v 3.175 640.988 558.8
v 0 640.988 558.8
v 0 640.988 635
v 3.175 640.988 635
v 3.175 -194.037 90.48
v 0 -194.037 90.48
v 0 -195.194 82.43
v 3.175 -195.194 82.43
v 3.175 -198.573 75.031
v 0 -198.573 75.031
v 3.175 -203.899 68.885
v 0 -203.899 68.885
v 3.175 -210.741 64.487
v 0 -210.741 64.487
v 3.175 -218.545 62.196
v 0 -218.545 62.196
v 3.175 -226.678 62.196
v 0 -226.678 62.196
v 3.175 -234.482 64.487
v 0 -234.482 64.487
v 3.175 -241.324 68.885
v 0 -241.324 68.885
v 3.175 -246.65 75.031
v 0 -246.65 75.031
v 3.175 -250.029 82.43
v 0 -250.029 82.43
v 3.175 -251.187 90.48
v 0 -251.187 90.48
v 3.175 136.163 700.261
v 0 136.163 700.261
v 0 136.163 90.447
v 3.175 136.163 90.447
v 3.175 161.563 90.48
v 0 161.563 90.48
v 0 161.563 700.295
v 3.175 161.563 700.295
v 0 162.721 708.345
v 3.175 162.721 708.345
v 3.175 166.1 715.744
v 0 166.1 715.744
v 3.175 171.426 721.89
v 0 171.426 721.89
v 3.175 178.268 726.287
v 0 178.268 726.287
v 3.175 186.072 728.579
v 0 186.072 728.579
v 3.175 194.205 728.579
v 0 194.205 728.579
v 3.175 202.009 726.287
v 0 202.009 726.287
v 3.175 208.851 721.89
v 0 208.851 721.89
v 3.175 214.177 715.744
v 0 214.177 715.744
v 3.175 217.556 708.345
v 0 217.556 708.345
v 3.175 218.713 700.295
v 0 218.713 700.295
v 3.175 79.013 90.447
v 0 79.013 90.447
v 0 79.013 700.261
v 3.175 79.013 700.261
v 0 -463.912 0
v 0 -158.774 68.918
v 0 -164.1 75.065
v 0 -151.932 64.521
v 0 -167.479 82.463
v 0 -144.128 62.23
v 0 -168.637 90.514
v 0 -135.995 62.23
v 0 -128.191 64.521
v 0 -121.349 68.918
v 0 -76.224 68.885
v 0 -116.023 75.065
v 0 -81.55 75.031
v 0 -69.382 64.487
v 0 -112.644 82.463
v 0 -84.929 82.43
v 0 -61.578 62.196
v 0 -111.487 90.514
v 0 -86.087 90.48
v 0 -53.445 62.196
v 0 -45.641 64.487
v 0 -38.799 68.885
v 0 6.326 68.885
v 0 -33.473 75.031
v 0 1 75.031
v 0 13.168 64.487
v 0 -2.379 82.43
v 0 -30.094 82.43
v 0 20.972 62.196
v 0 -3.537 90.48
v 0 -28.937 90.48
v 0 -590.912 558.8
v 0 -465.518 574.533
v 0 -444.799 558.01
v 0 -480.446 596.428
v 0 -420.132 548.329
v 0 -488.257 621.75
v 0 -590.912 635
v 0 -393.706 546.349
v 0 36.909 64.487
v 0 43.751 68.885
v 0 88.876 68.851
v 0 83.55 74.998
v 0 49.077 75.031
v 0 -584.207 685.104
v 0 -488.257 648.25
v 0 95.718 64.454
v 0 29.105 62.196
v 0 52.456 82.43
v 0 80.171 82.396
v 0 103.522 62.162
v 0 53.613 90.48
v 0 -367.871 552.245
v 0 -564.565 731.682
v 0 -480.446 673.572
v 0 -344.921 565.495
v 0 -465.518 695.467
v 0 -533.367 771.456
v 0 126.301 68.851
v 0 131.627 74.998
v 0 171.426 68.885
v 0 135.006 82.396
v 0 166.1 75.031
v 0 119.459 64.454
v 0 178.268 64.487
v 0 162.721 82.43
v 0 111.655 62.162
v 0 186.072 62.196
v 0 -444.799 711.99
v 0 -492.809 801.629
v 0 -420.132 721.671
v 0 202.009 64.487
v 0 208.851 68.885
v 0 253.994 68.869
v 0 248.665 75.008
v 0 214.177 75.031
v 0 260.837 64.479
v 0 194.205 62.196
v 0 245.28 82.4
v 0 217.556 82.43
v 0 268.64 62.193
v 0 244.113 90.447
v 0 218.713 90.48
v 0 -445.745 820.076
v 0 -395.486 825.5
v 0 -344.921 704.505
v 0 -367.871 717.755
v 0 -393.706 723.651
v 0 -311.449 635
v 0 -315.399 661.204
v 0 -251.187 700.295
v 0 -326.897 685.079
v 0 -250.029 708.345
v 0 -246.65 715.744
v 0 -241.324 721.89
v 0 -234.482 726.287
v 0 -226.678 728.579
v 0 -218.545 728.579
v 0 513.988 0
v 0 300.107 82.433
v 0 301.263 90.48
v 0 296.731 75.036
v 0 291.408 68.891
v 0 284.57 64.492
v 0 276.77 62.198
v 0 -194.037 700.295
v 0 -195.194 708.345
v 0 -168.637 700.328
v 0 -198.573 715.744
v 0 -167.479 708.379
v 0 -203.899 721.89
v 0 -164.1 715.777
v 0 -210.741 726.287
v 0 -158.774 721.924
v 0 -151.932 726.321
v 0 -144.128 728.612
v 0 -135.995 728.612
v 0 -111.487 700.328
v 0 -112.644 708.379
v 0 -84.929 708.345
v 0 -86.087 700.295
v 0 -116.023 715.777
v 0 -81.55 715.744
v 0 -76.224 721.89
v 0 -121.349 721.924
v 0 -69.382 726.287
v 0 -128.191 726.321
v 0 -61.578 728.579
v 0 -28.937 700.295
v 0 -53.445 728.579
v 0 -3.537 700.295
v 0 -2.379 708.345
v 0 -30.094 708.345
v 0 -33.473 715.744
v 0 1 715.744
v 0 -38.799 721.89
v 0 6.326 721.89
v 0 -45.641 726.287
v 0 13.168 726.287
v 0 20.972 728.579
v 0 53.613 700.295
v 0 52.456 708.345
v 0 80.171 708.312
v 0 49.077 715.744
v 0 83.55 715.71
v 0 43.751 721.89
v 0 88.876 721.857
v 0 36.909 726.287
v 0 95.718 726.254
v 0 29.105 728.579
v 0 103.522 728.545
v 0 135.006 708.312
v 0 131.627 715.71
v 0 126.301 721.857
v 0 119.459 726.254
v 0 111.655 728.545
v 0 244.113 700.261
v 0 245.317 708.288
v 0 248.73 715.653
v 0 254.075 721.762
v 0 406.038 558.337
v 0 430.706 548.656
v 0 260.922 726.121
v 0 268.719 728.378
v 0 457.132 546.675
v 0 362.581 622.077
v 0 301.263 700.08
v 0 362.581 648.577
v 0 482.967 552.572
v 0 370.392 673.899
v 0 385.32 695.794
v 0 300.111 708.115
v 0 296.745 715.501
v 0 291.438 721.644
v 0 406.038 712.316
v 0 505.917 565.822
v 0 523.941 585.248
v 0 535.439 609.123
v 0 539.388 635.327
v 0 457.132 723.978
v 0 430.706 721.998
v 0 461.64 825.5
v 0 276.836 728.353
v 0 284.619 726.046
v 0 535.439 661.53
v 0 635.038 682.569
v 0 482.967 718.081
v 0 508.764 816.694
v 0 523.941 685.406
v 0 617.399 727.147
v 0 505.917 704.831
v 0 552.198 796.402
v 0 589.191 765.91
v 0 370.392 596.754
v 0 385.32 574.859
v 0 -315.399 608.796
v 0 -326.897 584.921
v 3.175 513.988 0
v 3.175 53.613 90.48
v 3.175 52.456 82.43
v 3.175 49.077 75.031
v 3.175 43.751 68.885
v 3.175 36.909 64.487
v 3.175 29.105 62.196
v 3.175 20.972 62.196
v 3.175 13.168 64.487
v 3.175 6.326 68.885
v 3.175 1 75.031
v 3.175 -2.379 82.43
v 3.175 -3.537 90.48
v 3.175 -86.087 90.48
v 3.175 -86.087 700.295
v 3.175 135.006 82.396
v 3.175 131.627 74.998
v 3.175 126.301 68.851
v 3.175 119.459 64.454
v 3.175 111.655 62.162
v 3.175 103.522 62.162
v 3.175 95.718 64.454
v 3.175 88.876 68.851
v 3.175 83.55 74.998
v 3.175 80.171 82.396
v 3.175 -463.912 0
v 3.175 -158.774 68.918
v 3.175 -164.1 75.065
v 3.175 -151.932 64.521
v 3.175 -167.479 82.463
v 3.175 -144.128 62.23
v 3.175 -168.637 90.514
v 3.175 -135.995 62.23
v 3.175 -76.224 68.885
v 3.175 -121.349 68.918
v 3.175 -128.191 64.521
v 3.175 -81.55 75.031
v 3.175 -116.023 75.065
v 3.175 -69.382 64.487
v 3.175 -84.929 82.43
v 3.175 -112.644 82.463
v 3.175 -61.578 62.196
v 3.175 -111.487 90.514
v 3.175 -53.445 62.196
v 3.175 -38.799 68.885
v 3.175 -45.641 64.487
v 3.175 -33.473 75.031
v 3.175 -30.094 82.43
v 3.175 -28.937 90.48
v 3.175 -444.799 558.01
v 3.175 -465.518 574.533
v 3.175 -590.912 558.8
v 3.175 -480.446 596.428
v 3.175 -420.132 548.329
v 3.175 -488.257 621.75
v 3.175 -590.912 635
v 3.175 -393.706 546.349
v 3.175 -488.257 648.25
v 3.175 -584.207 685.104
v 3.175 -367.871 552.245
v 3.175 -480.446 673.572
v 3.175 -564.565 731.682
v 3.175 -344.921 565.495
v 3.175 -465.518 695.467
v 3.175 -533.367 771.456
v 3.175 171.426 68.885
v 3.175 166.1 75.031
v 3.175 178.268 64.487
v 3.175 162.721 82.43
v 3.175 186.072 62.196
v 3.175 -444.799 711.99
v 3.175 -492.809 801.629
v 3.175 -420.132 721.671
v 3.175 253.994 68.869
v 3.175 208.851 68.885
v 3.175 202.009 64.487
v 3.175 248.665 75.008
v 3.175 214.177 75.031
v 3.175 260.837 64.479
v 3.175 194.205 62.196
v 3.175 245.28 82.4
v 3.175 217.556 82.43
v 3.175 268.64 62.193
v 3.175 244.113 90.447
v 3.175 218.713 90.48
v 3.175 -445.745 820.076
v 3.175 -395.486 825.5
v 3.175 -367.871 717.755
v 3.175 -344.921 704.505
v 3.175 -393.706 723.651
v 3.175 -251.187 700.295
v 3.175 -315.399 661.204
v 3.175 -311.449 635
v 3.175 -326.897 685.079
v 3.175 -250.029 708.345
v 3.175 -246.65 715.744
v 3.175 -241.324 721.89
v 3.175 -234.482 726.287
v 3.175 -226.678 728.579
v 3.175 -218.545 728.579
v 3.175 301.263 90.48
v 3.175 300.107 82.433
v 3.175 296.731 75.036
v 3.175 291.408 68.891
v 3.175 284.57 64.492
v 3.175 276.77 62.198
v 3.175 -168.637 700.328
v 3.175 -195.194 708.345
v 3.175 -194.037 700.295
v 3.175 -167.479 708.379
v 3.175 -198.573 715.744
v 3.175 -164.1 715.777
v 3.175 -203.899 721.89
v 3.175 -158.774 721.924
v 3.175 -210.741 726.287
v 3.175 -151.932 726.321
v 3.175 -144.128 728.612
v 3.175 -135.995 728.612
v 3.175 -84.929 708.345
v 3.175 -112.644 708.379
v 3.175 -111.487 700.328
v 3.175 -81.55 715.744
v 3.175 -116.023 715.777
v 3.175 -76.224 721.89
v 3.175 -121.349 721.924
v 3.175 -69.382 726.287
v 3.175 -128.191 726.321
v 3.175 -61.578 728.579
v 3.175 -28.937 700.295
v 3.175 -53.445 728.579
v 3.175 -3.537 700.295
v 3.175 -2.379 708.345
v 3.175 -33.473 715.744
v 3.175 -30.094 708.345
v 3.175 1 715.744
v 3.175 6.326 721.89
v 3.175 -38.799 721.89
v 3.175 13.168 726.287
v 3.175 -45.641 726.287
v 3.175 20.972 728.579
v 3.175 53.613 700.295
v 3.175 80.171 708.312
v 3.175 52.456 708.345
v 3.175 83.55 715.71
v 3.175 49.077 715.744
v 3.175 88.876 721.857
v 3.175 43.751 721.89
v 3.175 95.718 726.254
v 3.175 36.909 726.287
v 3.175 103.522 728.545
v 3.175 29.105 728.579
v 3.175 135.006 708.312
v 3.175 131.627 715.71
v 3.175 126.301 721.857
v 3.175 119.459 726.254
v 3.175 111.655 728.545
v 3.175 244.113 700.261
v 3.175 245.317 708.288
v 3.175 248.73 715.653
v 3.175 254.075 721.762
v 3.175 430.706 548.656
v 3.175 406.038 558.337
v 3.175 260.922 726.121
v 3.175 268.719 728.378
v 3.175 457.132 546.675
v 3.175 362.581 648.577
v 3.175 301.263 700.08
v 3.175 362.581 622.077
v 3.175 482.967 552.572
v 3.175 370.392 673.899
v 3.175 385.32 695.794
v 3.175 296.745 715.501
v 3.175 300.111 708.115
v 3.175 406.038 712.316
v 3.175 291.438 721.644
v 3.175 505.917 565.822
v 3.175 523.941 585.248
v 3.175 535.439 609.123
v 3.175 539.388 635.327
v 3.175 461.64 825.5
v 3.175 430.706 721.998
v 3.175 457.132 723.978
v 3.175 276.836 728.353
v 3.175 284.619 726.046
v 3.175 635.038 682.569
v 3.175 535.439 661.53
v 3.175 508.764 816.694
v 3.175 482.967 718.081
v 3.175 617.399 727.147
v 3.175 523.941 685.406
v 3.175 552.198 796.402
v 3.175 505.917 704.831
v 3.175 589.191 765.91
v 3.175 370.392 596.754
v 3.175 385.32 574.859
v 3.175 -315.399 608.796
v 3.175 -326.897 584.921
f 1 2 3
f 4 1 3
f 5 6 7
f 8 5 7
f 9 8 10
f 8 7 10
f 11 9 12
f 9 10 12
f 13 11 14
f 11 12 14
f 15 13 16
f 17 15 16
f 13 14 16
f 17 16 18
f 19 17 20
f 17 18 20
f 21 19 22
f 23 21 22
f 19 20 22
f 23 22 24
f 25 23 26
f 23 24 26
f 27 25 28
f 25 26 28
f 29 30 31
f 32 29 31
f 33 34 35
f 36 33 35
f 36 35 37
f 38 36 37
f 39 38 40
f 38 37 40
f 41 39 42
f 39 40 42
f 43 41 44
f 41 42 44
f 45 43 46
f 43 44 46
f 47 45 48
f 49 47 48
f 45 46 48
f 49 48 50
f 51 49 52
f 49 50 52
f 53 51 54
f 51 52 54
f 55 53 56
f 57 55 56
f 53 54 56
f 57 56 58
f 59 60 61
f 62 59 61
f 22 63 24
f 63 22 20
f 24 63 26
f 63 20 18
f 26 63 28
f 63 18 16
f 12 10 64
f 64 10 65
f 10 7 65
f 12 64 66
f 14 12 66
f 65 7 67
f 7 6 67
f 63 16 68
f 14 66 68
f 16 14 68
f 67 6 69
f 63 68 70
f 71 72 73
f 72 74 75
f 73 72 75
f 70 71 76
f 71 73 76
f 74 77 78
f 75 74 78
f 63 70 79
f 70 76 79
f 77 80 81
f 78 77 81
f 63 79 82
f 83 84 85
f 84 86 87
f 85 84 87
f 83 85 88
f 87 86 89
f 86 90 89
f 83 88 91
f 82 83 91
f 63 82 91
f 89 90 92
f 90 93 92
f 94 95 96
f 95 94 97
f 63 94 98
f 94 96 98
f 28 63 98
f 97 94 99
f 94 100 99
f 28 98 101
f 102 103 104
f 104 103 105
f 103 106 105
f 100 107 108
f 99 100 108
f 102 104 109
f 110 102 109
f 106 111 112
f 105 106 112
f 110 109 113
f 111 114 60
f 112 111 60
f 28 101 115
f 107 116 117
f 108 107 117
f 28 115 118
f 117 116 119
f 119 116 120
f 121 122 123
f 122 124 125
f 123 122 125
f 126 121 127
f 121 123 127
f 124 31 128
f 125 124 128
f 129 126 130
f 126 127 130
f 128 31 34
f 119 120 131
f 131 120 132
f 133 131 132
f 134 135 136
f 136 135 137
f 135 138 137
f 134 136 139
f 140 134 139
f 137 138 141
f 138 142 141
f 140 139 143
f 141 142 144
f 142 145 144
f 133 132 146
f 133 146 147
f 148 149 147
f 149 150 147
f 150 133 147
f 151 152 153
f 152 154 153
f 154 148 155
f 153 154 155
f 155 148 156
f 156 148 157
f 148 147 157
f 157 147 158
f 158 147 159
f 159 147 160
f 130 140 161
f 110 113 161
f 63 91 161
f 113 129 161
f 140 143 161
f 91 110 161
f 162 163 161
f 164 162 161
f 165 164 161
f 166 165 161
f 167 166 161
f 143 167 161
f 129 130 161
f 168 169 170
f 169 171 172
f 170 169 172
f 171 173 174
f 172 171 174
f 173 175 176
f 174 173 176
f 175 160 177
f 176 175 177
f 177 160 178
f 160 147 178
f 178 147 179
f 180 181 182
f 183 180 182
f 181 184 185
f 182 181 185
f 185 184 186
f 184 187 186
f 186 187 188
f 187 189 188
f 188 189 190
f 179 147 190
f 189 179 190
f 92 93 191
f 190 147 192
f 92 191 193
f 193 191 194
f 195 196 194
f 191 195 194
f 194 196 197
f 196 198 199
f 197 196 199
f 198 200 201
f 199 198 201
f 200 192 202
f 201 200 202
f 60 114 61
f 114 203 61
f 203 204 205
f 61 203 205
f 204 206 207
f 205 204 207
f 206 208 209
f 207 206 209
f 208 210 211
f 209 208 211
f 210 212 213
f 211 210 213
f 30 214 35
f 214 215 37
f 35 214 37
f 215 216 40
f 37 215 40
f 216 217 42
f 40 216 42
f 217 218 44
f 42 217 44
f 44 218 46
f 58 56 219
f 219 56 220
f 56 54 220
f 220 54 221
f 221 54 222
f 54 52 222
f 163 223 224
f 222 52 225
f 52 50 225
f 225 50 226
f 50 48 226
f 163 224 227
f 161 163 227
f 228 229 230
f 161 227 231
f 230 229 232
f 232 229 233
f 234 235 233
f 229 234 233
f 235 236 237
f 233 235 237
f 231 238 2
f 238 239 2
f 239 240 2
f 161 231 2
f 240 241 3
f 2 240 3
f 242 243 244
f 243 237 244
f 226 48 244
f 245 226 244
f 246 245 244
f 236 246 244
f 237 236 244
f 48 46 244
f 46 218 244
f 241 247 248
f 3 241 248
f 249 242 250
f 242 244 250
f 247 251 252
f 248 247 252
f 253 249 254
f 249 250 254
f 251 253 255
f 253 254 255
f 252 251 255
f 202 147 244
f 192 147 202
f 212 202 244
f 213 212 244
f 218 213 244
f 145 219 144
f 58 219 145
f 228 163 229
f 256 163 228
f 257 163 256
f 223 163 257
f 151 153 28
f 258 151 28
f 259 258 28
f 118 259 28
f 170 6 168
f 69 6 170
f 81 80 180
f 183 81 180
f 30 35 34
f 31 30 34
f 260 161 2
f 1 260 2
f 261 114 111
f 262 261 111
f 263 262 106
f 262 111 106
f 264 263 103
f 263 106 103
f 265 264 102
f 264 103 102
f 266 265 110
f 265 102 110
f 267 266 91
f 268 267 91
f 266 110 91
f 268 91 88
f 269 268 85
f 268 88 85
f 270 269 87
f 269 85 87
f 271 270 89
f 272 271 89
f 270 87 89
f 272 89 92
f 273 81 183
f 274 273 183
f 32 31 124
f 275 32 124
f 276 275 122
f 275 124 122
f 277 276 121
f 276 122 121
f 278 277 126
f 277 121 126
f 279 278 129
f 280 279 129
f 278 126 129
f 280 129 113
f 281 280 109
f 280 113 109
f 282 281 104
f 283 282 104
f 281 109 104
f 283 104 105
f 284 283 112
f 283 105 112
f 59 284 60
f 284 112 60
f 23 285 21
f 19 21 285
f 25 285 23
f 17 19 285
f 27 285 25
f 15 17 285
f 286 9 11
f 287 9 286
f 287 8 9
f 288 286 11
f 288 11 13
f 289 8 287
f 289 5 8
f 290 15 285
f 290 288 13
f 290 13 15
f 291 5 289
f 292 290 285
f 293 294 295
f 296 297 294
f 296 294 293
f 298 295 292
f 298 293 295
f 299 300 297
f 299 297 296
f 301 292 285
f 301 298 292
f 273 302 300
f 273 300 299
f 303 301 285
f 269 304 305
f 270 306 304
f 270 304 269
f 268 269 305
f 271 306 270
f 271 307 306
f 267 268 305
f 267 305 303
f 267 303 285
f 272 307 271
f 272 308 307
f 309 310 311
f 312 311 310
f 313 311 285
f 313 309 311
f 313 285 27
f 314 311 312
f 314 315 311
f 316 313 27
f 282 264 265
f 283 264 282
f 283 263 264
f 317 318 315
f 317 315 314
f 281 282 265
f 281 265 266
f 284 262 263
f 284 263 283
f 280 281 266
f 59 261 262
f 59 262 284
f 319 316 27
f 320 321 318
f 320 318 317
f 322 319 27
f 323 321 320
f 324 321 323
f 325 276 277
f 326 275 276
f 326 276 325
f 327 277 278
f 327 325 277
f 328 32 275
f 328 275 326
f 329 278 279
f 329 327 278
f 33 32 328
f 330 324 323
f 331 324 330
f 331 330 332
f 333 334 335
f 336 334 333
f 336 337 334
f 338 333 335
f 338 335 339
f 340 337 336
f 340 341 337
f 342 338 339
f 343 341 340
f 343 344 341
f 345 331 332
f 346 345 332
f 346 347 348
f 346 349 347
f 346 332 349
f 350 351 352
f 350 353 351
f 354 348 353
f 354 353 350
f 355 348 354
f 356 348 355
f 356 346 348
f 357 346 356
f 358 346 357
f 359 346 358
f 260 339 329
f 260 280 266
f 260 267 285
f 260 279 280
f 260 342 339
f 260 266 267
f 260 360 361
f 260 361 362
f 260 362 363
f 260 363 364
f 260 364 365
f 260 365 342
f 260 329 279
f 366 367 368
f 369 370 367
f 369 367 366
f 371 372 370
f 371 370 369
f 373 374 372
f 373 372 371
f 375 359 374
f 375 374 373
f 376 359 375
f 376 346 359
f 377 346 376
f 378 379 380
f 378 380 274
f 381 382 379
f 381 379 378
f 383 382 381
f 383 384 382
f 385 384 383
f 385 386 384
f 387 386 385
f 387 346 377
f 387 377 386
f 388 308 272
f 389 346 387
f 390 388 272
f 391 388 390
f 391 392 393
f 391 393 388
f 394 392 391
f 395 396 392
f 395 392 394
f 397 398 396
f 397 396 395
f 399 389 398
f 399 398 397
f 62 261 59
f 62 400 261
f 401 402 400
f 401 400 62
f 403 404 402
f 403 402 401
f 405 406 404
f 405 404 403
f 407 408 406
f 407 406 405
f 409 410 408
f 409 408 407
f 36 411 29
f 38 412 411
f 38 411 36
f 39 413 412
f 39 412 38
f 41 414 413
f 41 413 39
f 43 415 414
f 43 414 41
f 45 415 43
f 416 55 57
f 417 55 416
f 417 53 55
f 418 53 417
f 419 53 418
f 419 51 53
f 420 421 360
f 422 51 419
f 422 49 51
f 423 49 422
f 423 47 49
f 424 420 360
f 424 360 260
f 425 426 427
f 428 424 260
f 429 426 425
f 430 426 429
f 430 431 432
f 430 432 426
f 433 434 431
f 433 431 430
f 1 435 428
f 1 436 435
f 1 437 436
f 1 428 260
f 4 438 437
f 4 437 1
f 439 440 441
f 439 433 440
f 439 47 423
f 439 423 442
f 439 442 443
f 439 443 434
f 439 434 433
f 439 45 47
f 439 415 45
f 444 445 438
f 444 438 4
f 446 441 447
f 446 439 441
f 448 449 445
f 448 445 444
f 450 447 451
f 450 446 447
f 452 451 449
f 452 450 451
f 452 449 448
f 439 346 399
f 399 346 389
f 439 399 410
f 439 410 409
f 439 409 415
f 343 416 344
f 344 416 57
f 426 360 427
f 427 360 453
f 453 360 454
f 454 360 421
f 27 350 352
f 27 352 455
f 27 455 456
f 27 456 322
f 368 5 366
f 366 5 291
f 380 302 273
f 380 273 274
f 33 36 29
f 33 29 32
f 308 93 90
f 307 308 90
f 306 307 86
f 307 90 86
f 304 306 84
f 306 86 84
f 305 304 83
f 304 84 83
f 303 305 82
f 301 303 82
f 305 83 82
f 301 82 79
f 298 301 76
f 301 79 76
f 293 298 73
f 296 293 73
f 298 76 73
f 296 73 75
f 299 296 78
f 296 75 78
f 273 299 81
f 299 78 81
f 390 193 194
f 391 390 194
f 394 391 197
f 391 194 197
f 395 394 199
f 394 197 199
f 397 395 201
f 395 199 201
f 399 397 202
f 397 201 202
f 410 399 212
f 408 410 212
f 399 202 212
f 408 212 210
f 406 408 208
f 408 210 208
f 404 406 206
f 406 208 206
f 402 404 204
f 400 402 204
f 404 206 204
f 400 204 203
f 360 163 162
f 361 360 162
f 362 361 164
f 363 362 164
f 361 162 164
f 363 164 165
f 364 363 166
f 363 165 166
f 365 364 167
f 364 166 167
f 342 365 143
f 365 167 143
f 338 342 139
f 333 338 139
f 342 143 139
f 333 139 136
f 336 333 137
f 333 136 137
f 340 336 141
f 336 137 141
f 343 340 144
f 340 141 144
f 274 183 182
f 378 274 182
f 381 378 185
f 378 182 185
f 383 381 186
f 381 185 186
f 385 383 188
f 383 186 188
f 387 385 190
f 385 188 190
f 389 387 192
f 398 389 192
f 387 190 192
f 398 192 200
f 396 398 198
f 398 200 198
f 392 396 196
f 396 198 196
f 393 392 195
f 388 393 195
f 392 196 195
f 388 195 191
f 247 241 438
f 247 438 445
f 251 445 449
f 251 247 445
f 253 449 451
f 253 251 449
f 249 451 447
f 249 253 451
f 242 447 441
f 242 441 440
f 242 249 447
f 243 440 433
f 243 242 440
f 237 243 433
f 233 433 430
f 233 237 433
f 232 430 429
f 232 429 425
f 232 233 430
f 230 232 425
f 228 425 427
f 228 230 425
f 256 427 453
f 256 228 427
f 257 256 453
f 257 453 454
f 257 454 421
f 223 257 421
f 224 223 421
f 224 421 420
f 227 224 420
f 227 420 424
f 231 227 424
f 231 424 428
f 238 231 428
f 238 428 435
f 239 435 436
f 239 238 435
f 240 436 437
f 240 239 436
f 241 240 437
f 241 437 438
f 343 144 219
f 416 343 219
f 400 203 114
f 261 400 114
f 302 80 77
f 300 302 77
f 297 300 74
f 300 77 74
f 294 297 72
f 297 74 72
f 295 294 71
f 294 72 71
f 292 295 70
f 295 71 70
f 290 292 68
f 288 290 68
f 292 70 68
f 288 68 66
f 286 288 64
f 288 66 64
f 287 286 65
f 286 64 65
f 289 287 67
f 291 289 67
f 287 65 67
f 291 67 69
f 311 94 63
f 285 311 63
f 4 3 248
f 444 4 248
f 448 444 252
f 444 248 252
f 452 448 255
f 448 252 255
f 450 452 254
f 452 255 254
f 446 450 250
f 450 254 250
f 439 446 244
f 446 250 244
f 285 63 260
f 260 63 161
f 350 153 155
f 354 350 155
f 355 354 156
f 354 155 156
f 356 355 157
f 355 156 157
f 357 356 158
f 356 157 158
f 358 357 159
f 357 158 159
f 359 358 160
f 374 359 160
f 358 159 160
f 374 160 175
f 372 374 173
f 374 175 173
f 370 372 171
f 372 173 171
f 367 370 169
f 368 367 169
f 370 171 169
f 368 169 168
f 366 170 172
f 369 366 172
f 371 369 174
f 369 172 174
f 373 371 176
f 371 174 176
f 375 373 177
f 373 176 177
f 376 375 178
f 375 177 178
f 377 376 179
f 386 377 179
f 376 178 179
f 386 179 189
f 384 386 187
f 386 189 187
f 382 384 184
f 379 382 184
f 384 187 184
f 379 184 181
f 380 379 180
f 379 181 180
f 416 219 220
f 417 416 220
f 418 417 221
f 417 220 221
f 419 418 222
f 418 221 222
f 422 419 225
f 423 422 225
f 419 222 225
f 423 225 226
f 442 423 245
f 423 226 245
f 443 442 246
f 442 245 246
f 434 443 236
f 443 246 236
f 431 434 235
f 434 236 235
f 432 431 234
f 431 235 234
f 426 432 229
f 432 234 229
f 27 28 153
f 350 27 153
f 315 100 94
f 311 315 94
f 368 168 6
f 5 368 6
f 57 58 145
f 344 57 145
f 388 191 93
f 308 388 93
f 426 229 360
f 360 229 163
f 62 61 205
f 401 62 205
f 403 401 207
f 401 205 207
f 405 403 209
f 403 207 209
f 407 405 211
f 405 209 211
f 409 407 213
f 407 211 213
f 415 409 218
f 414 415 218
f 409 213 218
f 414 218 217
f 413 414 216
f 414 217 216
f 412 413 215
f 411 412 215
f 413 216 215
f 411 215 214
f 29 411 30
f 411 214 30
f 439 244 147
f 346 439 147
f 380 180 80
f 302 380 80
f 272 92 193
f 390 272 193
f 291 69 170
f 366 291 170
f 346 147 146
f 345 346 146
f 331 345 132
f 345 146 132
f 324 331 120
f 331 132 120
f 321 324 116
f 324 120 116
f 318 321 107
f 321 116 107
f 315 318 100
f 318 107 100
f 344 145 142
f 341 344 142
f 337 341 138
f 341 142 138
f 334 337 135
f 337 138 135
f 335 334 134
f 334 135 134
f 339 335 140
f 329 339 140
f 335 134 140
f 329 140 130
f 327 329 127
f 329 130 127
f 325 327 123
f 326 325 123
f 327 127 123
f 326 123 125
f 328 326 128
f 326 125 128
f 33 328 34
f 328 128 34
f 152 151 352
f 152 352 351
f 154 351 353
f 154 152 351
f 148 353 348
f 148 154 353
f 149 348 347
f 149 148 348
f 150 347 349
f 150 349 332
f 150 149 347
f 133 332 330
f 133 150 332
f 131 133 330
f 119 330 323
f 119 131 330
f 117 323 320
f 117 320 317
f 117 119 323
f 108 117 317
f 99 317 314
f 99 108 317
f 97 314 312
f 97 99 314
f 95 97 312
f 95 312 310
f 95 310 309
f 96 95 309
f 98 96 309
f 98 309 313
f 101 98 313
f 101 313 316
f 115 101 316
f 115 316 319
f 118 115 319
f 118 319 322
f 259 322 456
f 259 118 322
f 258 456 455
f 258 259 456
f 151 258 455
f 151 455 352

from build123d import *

# Parameters (mm, degrees)
F0_R     = 88.9
F1_DEPTH = 3.175


with BuildPart() as f1:
    # F0 (on Right) → F1 (new body)
    with BuildSketch(Plane.YZ):
        with BuildLine():
            Line((640.988467, 558.8), (640.988181, 635))
            ThreePointArc((640.988181, 635), (589.190891, 765.909542), (461.639941, 825.5))
            Line((461.639941, 825.5), (-395.486476, 825.5))
            ThreePointArc((-395.486476, 825.5), (-533.366758, 771.456223), (-590.911533, 635))
            Line((-590.911533, 635), (-590.911533, 558.8))
            Line((-590.911533, 558.8), (-463.911533, 0))
            Line((-463.911533, 0), (513.988467, 0))
            Line((513.988467, 0), (640.988467, 558.8))
        make_face()
        with BuildLine():
            ThreePointArc((-251.186533, 700.2947), (-222.611533, 728.8697), (-194.036533, 700.2947))
            Line((-194.036533, 700.2947), (-194.036533, 90.480119))
            ThreePointArc((-194.036533, 90.480119), (-222.611533, 61.905119), (-251.186533, 90.480119))
            Line((-251.186533, 90.480119), (-251.186533, 700.2947))
        make_face(mode=Mode.SUBTRACT)
        with BuildLine():
            ThreePointArc((-168.636533, 700.328295), (-140.061533, 728.903295), (-111.486533, 700.328295))
            Line((-111.486533, 700.328295), (-111.486533, 90.513714))
            ThreePointArc((-111.486533, 90.513714), (-140.061533, 61.938714), (-168.636533, 90.513714))
            Line((-168.636533, 90.513714), (-168.636533, 700.328295))
        make_face(mode=Mode.SUBTRACT)
        with BuildLine():
            ThreePointArc((-86.086533, 700.2947), (-57.511533, 728.8697), (-28.936533, 700.2947))
            Line((-28.936533, 700.2947), (-28.936533, 90.480119))
            ThreePointArc((-28.936533, 90.480119), (-57.511533, 61.905119), (-86.086533, 90.480119))
            Line((-86.086533, 90.480119), (-86.086533, 700.2947))
        make_face(mode=Mode.SUBTRACT)
        with BuildLine():
            ThreePointArc((-3.536533, 700.2947), (25.038467, 728.8697), (53.613467, 700.2947))
            Line((53.613467, 700.2947), (53.613467, 90.480119))
            ThreePointArc((53.613467, 90.480119), (25.038467, 61.905119), (-3.536533, 90.480119))
            Line((-3.536533, 90.480119), (-3.536533, 700.2947))
        make_face(mode=Mode.SUBTRACT)
        with BuildLine():
            ThreePointArc((79.013467, 700.261105), (107.588467, 728.836105), (136.163467, 700.261105))
            Line((136.163467, 700.261105), (136.163467, 90.446524))
            ThreePointArc((136.163467, 90.446524), (107.588467, 61.871524), (79.013467, 90.446524))
            Line((79.013467, 90.446524), (79.013467, 700.261105))
        make_face(mode=Mode.SUBTRACT)
        with BuildLine():
            ThreePointArc((161.563467, 700.2947), (190.138467, 728.8697), (218.713467, 700.2947))
            Line((218.713467, 700.2947), (218.713467, 90.480119))
            ThreePointArc((218.713467, 90.480119), (190.138467, 61.905119), (161.563467, 90.480119))
            Line((161.563467, 90.480119), (161.563467, 700.2947))
        make_face(mode=Mode.SUBTRACT)
        with BuildLine():
            ThreePointArc((244.113467, 700.261105), (272.778674, 728.655262), (301.263467, 700.080119))
            Line((301.263467, 700.080119), (301.263467, 90.480119))
            ThreePointArc((301.263467, 90.480119), (272.705255, 61.905114), (244.113467, 90.446524))
            Line((244.113467, 90.446524), (244.113467, 700.261105))
        make_face(mode=Mode.SUBTRACT)
        with Locations((-400.349473, 635)):
            Circle(F0_R, mode=Mode.SUBTRACT)
        with Locations((450.488461, 635.326673)):
            Circle(F0_R, mode=Mode.SUBTRACT)
    extrude(amount=F1_DEPTH)


solid = f1.part
